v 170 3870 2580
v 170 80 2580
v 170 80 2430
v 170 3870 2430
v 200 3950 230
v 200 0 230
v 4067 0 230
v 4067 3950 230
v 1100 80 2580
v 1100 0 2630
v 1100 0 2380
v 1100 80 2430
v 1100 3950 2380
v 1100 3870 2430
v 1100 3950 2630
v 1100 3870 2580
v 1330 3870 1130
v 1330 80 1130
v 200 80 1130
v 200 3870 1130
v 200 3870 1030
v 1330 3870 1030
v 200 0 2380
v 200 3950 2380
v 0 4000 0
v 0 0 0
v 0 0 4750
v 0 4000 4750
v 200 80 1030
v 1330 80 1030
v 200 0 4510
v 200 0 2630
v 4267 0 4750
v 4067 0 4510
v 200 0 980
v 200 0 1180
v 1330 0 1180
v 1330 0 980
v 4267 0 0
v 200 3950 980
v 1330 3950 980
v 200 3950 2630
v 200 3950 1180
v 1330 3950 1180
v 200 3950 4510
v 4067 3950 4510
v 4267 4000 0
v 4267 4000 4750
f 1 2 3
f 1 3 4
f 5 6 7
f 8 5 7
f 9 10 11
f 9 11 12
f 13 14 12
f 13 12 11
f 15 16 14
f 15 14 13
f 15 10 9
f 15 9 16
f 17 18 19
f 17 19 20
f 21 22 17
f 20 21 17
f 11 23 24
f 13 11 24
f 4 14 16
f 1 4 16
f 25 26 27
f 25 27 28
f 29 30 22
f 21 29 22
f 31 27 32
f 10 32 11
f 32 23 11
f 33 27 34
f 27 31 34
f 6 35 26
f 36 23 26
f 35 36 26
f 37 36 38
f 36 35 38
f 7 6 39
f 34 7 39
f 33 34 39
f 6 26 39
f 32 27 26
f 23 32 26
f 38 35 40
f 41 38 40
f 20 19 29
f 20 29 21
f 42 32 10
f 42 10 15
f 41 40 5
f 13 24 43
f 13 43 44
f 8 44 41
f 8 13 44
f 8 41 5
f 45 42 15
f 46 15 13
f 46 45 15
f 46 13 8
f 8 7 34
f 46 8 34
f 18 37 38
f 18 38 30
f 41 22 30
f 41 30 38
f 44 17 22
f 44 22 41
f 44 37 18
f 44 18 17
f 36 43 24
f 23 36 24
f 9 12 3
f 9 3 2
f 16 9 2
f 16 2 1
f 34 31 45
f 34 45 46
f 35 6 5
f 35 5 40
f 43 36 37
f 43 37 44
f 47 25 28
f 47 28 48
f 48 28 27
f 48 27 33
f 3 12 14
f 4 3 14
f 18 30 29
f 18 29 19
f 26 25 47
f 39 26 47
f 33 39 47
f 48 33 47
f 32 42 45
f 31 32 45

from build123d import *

# Parameters (mm, degrees)
F0_W      = 4267
F0_H      = 4000
F1_DEPTH  = 4750
F2_W      = 3867
F2_H      = 4280
F3_DEPTH  = 3950
F4_W      = 3950
F4_H      = 200
F5_DEPTH  = 1130
F6_W      = 3950
F6_H      = 250
F7_DEPTH  = 900
F8_W      = 3790
F8_H      = 150
F9_DEPTH  = 930
F10_W     = 3790
F10_H     = 100
F11_DEPTH = 1130


with BuildPart() as f1:
    # F0 (on Top) → F1 (new body)
    with BuildSketch(Plane.XY):
        with Locations((2133.5, 2000)):
            Rectangle(F0_W, F0_H)
    extrude(amount=F1_DEPTH)

    # F2 (on face) → F3 (cut)
    with BuildSketch(Plane.XZ):
        with Locations((2133.5, 2370)):
            Rectangle(F2_W, F2_H)
    extrude(amount=-F3_DEPTH, mode=Mode.SUBTRACT)

    # F4 (on face) → F5 (join)
    with BuildSketch(Plane.YZ.offset(200)):
        with Locations((1975, 1080)):
            Rectangle(F4_W, F4_H)
    extrude(amount=F5_DEPTH)

    # F6 (on face) → F7 (join)
    with BuildSketch(Plane.YZ.offset(200)):
        with Locations((1975, 2505)):
            Rectangle(F6_W, F6_H)
    extrude(amount=F7_DEPTH)

    # F8 (on face) → F9 (cut)
    with BuildSketch(Plane.YZ.offset(1100)):
        with Locations((1975, 2505)):
            Rectangle(F8_W, F8_H)
    extrude(amount=-F9_DEPTH, mode=Mode.SUBTRACT)

    # F10 (on face) → F11 (cut)
    with BuildSketch(Plane.YZ.offset(1330)):
        with Locations((1975, 1080)):
            Rectangle(F10_W, F10_H)
    extrude(amount=-F11_DEPTH, mode=Mode.SUBTRACT)


solid = f1.part
